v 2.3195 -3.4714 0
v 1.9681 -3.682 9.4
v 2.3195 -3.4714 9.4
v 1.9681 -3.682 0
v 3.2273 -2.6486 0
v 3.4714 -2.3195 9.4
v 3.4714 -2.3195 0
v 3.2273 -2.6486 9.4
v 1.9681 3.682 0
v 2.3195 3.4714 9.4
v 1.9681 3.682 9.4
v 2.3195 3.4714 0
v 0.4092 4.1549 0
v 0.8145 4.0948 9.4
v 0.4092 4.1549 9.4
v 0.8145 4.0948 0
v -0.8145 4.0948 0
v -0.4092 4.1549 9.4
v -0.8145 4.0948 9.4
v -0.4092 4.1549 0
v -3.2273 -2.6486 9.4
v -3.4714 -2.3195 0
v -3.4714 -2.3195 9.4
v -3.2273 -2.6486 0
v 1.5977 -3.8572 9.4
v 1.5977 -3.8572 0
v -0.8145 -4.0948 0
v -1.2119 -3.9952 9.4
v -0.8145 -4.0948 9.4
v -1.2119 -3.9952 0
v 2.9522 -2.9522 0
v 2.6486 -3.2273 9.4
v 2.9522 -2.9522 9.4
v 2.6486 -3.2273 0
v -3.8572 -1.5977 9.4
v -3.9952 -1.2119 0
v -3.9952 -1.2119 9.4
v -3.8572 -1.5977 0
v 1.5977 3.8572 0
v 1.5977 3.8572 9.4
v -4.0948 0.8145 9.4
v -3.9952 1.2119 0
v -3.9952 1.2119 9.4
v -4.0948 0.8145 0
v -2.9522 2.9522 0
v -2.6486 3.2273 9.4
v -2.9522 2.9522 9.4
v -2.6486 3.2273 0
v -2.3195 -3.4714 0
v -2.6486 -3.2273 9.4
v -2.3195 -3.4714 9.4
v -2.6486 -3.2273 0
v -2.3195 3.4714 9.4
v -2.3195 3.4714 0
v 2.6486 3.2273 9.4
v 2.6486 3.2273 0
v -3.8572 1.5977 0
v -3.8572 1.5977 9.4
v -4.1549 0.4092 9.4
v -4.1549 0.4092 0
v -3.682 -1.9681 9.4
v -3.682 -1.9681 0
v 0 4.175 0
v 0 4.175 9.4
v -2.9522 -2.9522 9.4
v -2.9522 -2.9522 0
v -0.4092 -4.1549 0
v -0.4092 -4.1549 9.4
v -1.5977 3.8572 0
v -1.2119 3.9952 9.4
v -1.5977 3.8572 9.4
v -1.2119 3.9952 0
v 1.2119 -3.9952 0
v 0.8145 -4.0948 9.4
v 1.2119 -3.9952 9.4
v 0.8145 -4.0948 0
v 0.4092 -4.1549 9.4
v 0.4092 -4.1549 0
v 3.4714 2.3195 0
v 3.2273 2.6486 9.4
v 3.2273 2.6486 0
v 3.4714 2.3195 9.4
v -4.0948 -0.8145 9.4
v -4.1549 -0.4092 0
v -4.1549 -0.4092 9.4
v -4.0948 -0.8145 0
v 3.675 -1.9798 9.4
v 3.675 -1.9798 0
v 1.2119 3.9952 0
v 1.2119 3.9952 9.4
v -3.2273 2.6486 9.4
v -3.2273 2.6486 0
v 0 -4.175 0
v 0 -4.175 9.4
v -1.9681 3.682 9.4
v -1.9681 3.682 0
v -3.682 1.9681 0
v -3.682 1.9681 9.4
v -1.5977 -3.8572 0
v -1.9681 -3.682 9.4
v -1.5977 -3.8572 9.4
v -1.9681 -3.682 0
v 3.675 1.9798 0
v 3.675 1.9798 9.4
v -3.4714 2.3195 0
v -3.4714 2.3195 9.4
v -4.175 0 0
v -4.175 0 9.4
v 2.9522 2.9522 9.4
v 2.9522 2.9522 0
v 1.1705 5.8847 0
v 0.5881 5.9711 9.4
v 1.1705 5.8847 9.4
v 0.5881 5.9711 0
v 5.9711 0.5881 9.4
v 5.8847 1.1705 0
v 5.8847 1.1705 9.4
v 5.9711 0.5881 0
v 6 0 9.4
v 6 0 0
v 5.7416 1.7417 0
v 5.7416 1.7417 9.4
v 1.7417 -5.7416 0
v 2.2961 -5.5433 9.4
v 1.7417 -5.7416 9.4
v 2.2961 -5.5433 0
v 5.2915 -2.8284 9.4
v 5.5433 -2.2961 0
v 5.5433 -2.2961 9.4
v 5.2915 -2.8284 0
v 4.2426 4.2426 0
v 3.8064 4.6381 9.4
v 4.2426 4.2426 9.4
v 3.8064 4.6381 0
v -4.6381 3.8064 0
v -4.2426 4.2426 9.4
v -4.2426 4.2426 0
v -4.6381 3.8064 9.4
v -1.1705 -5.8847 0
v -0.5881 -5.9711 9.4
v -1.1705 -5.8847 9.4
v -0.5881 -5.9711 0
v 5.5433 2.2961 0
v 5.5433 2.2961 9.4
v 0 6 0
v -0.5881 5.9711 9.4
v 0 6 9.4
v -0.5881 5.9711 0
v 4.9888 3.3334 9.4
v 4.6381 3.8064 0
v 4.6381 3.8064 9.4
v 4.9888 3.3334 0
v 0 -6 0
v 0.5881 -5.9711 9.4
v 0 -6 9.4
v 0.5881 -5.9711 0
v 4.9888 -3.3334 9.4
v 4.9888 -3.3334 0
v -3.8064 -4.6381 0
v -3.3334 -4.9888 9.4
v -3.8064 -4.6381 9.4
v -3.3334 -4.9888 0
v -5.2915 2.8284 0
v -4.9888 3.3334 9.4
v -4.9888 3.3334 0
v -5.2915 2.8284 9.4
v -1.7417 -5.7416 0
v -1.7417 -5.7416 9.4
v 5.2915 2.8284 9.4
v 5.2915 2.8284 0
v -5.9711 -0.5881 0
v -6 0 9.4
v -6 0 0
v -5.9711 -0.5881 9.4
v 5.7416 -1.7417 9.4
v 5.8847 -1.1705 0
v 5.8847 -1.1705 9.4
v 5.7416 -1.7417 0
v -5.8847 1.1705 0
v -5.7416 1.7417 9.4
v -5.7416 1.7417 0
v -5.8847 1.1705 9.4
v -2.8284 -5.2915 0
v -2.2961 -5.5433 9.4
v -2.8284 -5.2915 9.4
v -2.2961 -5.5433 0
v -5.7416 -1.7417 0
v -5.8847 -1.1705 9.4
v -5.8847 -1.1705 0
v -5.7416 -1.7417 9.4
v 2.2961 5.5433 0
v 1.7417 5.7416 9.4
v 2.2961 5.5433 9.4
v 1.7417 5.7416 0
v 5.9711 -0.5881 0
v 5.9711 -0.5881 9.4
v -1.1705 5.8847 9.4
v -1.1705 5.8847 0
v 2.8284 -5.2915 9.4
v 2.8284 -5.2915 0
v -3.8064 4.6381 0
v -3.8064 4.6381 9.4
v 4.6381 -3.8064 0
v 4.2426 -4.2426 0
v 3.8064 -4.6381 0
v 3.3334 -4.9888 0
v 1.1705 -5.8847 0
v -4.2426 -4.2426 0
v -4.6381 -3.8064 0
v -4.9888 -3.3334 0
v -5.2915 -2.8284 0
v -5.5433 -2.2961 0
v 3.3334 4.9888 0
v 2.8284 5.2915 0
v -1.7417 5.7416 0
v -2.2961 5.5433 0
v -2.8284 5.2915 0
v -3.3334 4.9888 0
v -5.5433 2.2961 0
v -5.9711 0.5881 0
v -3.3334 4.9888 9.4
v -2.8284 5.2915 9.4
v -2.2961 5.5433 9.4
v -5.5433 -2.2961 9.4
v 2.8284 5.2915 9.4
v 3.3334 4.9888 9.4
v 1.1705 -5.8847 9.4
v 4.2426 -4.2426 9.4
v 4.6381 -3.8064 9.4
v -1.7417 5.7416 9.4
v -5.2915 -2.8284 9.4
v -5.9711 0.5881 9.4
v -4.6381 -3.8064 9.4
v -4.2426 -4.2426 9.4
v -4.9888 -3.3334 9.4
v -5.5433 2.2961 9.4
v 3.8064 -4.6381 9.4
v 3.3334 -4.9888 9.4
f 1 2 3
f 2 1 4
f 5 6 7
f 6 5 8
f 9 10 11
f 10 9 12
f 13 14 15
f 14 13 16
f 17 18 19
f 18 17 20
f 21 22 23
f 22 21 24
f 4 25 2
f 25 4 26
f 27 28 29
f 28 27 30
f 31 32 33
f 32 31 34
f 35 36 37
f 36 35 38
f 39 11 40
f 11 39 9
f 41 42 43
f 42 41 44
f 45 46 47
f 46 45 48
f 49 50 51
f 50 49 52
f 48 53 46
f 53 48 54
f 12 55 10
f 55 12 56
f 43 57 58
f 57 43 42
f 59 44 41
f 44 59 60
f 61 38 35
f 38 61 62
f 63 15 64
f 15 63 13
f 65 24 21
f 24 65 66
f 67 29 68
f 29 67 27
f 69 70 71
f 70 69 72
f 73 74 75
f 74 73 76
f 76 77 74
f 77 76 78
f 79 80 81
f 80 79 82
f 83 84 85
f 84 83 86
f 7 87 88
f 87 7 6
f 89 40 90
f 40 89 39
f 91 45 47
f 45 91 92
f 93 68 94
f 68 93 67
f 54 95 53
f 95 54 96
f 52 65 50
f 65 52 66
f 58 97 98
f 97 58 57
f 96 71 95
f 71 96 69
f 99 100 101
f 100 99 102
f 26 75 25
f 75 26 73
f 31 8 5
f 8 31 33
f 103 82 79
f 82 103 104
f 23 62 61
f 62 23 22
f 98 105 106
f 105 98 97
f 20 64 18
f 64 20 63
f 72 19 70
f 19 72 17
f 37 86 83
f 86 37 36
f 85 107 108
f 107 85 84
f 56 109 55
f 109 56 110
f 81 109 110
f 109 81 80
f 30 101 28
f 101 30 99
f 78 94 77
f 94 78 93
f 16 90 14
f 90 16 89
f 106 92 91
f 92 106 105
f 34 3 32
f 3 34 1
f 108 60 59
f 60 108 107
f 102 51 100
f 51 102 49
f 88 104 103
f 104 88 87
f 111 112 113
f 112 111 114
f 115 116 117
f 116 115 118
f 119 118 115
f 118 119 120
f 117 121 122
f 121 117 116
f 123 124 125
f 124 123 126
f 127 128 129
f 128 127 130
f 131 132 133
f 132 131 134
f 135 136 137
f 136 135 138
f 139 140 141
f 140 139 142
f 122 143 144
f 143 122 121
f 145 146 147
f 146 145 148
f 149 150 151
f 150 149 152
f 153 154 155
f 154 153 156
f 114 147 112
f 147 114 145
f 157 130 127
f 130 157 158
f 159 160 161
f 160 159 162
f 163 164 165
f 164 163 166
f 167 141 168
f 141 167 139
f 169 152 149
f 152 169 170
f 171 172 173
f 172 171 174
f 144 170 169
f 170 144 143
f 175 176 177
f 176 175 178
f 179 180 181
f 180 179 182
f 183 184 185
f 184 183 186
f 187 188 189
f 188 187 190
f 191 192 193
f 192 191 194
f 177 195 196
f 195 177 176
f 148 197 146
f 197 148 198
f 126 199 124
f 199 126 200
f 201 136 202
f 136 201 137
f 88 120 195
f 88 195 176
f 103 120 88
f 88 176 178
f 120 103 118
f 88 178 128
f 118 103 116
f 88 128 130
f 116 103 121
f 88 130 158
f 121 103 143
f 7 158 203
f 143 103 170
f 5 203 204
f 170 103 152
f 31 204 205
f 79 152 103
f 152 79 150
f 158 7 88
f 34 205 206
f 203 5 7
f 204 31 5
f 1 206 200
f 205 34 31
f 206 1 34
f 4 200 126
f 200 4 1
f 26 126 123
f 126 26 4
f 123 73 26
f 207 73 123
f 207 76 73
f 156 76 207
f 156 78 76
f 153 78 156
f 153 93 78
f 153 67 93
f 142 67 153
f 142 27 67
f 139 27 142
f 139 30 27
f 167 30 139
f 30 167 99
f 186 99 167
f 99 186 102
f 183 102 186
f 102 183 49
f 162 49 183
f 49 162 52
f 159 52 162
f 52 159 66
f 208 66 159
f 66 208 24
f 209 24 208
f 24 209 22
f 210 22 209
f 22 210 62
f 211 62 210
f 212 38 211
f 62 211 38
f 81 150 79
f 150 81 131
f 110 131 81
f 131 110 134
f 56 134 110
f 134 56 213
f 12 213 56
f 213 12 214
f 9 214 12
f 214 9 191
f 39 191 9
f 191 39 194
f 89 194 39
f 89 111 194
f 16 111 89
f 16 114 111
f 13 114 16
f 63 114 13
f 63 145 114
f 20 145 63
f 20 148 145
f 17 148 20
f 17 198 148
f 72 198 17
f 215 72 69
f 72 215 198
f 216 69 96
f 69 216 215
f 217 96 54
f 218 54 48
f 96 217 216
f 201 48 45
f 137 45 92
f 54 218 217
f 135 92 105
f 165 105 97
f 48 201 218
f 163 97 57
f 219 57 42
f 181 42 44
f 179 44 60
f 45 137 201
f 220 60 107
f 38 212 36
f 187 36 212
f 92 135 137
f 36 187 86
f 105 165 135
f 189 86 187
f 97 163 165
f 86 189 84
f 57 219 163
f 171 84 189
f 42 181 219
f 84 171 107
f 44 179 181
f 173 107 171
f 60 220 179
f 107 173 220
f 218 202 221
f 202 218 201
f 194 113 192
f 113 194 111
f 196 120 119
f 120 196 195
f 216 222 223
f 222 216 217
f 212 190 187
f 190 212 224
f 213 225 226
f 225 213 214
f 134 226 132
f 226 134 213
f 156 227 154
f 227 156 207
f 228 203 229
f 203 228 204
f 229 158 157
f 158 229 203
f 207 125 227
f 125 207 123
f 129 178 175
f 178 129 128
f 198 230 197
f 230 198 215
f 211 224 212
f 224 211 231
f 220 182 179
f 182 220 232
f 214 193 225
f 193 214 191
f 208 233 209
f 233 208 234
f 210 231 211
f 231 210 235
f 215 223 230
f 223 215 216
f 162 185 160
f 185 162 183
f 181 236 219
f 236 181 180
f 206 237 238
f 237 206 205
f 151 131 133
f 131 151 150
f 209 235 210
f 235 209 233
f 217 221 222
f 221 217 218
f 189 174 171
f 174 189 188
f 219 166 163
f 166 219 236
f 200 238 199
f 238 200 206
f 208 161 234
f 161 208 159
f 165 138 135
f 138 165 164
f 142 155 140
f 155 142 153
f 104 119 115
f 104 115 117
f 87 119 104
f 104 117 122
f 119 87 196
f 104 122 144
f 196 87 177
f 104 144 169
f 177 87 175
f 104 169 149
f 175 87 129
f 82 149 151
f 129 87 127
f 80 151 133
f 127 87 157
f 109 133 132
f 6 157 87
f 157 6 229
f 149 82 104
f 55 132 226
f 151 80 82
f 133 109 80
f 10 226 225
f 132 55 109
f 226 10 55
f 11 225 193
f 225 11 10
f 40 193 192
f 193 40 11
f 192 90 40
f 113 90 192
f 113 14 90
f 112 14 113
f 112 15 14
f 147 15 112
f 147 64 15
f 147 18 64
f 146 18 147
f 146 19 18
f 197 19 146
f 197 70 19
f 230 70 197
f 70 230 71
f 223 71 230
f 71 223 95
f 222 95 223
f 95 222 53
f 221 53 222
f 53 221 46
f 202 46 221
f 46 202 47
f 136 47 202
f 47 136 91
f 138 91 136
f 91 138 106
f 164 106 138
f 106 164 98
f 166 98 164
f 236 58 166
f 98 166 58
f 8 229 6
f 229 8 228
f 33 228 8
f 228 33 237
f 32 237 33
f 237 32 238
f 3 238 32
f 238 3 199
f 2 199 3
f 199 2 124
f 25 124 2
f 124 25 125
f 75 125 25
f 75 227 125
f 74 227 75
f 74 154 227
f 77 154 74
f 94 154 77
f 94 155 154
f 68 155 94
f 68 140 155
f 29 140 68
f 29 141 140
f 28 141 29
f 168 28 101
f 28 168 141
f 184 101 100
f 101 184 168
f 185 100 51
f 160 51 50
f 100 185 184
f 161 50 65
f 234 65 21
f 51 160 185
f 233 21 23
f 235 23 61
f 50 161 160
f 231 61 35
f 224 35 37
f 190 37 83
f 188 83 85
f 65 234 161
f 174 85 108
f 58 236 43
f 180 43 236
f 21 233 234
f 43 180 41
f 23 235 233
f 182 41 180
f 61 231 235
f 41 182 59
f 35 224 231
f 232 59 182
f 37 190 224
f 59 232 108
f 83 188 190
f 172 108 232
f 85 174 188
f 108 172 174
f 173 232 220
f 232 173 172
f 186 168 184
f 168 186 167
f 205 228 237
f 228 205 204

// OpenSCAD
// Gen-CS — gap sleeve: rigid spacer on the shaft BETWEEN the two rotor carriers (passes through the stator
// hole). Length = m2m, so it sets the magnet gap and carries the full magnet pull. Print x1, upright.
include <parameters.scad>;
$fn = 64;
// D-flat keyed bore: flat faces +X (angle 0 = magnet pocket 0 = index notch)
module dflat_bore(h) {
    intersection() {
        cylinder(d=shaft_bore, h=h);
        translate([-shaft_bore, -shaft_bore, 0]) cube([shaft_bore + dflat_x, 2*shaft_bore, h]);
    }
}

difference() {
    cylinder(d=sleeve_od, h=m2m);
    translate([0, 0, -0.1]) dflat_bore(m2m + 0.2);
}
